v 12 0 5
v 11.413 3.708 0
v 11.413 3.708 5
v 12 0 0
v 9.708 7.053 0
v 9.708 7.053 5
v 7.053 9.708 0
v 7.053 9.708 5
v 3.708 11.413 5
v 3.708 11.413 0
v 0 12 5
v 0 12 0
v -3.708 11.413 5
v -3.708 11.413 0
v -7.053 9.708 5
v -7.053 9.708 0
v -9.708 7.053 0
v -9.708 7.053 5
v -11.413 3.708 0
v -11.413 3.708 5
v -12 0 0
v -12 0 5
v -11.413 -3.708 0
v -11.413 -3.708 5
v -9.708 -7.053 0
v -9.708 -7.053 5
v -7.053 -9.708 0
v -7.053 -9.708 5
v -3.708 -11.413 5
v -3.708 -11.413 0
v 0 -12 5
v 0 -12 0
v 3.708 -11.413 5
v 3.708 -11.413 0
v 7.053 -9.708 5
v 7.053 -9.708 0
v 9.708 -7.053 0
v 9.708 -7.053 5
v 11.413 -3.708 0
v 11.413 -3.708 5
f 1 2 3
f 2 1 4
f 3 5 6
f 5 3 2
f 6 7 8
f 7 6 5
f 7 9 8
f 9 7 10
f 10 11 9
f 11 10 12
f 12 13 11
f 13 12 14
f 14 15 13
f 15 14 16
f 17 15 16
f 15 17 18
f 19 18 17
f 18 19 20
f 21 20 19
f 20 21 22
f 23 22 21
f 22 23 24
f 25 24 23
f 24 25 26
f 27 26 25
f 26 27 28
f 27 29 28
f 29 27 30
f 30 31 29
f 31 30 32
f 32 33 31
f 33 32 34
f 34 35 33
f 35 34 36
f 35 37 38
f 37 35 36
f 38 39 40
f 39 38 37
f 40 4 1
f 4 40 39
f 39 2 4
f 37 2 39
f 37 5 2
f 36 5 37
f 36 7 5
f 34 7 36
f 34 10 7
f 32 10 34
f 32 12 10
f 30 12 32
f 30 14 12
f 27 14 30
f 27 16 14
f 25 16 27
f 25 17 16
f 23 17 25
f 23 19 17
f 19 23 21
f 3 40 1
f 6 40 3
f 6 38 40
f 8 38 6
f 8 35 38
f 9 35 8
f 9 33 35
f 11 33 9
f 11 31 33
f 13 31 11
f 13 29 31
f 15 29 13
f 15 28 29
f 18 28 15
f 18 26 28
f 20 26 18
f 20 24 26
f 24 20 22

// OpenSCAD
radius = 24.0;
height = 5.0;

/* [OpenSCAD] [Quality] */
$fn = 20;

module CylinderDispenser_Dispenser_Hearth_Outer_Lip(diameter, height){
		cylinder(d=diameter, h=height);
}

CylinderDispenser_Dispenser_Hearth_Outer_Lip(radius, height);
